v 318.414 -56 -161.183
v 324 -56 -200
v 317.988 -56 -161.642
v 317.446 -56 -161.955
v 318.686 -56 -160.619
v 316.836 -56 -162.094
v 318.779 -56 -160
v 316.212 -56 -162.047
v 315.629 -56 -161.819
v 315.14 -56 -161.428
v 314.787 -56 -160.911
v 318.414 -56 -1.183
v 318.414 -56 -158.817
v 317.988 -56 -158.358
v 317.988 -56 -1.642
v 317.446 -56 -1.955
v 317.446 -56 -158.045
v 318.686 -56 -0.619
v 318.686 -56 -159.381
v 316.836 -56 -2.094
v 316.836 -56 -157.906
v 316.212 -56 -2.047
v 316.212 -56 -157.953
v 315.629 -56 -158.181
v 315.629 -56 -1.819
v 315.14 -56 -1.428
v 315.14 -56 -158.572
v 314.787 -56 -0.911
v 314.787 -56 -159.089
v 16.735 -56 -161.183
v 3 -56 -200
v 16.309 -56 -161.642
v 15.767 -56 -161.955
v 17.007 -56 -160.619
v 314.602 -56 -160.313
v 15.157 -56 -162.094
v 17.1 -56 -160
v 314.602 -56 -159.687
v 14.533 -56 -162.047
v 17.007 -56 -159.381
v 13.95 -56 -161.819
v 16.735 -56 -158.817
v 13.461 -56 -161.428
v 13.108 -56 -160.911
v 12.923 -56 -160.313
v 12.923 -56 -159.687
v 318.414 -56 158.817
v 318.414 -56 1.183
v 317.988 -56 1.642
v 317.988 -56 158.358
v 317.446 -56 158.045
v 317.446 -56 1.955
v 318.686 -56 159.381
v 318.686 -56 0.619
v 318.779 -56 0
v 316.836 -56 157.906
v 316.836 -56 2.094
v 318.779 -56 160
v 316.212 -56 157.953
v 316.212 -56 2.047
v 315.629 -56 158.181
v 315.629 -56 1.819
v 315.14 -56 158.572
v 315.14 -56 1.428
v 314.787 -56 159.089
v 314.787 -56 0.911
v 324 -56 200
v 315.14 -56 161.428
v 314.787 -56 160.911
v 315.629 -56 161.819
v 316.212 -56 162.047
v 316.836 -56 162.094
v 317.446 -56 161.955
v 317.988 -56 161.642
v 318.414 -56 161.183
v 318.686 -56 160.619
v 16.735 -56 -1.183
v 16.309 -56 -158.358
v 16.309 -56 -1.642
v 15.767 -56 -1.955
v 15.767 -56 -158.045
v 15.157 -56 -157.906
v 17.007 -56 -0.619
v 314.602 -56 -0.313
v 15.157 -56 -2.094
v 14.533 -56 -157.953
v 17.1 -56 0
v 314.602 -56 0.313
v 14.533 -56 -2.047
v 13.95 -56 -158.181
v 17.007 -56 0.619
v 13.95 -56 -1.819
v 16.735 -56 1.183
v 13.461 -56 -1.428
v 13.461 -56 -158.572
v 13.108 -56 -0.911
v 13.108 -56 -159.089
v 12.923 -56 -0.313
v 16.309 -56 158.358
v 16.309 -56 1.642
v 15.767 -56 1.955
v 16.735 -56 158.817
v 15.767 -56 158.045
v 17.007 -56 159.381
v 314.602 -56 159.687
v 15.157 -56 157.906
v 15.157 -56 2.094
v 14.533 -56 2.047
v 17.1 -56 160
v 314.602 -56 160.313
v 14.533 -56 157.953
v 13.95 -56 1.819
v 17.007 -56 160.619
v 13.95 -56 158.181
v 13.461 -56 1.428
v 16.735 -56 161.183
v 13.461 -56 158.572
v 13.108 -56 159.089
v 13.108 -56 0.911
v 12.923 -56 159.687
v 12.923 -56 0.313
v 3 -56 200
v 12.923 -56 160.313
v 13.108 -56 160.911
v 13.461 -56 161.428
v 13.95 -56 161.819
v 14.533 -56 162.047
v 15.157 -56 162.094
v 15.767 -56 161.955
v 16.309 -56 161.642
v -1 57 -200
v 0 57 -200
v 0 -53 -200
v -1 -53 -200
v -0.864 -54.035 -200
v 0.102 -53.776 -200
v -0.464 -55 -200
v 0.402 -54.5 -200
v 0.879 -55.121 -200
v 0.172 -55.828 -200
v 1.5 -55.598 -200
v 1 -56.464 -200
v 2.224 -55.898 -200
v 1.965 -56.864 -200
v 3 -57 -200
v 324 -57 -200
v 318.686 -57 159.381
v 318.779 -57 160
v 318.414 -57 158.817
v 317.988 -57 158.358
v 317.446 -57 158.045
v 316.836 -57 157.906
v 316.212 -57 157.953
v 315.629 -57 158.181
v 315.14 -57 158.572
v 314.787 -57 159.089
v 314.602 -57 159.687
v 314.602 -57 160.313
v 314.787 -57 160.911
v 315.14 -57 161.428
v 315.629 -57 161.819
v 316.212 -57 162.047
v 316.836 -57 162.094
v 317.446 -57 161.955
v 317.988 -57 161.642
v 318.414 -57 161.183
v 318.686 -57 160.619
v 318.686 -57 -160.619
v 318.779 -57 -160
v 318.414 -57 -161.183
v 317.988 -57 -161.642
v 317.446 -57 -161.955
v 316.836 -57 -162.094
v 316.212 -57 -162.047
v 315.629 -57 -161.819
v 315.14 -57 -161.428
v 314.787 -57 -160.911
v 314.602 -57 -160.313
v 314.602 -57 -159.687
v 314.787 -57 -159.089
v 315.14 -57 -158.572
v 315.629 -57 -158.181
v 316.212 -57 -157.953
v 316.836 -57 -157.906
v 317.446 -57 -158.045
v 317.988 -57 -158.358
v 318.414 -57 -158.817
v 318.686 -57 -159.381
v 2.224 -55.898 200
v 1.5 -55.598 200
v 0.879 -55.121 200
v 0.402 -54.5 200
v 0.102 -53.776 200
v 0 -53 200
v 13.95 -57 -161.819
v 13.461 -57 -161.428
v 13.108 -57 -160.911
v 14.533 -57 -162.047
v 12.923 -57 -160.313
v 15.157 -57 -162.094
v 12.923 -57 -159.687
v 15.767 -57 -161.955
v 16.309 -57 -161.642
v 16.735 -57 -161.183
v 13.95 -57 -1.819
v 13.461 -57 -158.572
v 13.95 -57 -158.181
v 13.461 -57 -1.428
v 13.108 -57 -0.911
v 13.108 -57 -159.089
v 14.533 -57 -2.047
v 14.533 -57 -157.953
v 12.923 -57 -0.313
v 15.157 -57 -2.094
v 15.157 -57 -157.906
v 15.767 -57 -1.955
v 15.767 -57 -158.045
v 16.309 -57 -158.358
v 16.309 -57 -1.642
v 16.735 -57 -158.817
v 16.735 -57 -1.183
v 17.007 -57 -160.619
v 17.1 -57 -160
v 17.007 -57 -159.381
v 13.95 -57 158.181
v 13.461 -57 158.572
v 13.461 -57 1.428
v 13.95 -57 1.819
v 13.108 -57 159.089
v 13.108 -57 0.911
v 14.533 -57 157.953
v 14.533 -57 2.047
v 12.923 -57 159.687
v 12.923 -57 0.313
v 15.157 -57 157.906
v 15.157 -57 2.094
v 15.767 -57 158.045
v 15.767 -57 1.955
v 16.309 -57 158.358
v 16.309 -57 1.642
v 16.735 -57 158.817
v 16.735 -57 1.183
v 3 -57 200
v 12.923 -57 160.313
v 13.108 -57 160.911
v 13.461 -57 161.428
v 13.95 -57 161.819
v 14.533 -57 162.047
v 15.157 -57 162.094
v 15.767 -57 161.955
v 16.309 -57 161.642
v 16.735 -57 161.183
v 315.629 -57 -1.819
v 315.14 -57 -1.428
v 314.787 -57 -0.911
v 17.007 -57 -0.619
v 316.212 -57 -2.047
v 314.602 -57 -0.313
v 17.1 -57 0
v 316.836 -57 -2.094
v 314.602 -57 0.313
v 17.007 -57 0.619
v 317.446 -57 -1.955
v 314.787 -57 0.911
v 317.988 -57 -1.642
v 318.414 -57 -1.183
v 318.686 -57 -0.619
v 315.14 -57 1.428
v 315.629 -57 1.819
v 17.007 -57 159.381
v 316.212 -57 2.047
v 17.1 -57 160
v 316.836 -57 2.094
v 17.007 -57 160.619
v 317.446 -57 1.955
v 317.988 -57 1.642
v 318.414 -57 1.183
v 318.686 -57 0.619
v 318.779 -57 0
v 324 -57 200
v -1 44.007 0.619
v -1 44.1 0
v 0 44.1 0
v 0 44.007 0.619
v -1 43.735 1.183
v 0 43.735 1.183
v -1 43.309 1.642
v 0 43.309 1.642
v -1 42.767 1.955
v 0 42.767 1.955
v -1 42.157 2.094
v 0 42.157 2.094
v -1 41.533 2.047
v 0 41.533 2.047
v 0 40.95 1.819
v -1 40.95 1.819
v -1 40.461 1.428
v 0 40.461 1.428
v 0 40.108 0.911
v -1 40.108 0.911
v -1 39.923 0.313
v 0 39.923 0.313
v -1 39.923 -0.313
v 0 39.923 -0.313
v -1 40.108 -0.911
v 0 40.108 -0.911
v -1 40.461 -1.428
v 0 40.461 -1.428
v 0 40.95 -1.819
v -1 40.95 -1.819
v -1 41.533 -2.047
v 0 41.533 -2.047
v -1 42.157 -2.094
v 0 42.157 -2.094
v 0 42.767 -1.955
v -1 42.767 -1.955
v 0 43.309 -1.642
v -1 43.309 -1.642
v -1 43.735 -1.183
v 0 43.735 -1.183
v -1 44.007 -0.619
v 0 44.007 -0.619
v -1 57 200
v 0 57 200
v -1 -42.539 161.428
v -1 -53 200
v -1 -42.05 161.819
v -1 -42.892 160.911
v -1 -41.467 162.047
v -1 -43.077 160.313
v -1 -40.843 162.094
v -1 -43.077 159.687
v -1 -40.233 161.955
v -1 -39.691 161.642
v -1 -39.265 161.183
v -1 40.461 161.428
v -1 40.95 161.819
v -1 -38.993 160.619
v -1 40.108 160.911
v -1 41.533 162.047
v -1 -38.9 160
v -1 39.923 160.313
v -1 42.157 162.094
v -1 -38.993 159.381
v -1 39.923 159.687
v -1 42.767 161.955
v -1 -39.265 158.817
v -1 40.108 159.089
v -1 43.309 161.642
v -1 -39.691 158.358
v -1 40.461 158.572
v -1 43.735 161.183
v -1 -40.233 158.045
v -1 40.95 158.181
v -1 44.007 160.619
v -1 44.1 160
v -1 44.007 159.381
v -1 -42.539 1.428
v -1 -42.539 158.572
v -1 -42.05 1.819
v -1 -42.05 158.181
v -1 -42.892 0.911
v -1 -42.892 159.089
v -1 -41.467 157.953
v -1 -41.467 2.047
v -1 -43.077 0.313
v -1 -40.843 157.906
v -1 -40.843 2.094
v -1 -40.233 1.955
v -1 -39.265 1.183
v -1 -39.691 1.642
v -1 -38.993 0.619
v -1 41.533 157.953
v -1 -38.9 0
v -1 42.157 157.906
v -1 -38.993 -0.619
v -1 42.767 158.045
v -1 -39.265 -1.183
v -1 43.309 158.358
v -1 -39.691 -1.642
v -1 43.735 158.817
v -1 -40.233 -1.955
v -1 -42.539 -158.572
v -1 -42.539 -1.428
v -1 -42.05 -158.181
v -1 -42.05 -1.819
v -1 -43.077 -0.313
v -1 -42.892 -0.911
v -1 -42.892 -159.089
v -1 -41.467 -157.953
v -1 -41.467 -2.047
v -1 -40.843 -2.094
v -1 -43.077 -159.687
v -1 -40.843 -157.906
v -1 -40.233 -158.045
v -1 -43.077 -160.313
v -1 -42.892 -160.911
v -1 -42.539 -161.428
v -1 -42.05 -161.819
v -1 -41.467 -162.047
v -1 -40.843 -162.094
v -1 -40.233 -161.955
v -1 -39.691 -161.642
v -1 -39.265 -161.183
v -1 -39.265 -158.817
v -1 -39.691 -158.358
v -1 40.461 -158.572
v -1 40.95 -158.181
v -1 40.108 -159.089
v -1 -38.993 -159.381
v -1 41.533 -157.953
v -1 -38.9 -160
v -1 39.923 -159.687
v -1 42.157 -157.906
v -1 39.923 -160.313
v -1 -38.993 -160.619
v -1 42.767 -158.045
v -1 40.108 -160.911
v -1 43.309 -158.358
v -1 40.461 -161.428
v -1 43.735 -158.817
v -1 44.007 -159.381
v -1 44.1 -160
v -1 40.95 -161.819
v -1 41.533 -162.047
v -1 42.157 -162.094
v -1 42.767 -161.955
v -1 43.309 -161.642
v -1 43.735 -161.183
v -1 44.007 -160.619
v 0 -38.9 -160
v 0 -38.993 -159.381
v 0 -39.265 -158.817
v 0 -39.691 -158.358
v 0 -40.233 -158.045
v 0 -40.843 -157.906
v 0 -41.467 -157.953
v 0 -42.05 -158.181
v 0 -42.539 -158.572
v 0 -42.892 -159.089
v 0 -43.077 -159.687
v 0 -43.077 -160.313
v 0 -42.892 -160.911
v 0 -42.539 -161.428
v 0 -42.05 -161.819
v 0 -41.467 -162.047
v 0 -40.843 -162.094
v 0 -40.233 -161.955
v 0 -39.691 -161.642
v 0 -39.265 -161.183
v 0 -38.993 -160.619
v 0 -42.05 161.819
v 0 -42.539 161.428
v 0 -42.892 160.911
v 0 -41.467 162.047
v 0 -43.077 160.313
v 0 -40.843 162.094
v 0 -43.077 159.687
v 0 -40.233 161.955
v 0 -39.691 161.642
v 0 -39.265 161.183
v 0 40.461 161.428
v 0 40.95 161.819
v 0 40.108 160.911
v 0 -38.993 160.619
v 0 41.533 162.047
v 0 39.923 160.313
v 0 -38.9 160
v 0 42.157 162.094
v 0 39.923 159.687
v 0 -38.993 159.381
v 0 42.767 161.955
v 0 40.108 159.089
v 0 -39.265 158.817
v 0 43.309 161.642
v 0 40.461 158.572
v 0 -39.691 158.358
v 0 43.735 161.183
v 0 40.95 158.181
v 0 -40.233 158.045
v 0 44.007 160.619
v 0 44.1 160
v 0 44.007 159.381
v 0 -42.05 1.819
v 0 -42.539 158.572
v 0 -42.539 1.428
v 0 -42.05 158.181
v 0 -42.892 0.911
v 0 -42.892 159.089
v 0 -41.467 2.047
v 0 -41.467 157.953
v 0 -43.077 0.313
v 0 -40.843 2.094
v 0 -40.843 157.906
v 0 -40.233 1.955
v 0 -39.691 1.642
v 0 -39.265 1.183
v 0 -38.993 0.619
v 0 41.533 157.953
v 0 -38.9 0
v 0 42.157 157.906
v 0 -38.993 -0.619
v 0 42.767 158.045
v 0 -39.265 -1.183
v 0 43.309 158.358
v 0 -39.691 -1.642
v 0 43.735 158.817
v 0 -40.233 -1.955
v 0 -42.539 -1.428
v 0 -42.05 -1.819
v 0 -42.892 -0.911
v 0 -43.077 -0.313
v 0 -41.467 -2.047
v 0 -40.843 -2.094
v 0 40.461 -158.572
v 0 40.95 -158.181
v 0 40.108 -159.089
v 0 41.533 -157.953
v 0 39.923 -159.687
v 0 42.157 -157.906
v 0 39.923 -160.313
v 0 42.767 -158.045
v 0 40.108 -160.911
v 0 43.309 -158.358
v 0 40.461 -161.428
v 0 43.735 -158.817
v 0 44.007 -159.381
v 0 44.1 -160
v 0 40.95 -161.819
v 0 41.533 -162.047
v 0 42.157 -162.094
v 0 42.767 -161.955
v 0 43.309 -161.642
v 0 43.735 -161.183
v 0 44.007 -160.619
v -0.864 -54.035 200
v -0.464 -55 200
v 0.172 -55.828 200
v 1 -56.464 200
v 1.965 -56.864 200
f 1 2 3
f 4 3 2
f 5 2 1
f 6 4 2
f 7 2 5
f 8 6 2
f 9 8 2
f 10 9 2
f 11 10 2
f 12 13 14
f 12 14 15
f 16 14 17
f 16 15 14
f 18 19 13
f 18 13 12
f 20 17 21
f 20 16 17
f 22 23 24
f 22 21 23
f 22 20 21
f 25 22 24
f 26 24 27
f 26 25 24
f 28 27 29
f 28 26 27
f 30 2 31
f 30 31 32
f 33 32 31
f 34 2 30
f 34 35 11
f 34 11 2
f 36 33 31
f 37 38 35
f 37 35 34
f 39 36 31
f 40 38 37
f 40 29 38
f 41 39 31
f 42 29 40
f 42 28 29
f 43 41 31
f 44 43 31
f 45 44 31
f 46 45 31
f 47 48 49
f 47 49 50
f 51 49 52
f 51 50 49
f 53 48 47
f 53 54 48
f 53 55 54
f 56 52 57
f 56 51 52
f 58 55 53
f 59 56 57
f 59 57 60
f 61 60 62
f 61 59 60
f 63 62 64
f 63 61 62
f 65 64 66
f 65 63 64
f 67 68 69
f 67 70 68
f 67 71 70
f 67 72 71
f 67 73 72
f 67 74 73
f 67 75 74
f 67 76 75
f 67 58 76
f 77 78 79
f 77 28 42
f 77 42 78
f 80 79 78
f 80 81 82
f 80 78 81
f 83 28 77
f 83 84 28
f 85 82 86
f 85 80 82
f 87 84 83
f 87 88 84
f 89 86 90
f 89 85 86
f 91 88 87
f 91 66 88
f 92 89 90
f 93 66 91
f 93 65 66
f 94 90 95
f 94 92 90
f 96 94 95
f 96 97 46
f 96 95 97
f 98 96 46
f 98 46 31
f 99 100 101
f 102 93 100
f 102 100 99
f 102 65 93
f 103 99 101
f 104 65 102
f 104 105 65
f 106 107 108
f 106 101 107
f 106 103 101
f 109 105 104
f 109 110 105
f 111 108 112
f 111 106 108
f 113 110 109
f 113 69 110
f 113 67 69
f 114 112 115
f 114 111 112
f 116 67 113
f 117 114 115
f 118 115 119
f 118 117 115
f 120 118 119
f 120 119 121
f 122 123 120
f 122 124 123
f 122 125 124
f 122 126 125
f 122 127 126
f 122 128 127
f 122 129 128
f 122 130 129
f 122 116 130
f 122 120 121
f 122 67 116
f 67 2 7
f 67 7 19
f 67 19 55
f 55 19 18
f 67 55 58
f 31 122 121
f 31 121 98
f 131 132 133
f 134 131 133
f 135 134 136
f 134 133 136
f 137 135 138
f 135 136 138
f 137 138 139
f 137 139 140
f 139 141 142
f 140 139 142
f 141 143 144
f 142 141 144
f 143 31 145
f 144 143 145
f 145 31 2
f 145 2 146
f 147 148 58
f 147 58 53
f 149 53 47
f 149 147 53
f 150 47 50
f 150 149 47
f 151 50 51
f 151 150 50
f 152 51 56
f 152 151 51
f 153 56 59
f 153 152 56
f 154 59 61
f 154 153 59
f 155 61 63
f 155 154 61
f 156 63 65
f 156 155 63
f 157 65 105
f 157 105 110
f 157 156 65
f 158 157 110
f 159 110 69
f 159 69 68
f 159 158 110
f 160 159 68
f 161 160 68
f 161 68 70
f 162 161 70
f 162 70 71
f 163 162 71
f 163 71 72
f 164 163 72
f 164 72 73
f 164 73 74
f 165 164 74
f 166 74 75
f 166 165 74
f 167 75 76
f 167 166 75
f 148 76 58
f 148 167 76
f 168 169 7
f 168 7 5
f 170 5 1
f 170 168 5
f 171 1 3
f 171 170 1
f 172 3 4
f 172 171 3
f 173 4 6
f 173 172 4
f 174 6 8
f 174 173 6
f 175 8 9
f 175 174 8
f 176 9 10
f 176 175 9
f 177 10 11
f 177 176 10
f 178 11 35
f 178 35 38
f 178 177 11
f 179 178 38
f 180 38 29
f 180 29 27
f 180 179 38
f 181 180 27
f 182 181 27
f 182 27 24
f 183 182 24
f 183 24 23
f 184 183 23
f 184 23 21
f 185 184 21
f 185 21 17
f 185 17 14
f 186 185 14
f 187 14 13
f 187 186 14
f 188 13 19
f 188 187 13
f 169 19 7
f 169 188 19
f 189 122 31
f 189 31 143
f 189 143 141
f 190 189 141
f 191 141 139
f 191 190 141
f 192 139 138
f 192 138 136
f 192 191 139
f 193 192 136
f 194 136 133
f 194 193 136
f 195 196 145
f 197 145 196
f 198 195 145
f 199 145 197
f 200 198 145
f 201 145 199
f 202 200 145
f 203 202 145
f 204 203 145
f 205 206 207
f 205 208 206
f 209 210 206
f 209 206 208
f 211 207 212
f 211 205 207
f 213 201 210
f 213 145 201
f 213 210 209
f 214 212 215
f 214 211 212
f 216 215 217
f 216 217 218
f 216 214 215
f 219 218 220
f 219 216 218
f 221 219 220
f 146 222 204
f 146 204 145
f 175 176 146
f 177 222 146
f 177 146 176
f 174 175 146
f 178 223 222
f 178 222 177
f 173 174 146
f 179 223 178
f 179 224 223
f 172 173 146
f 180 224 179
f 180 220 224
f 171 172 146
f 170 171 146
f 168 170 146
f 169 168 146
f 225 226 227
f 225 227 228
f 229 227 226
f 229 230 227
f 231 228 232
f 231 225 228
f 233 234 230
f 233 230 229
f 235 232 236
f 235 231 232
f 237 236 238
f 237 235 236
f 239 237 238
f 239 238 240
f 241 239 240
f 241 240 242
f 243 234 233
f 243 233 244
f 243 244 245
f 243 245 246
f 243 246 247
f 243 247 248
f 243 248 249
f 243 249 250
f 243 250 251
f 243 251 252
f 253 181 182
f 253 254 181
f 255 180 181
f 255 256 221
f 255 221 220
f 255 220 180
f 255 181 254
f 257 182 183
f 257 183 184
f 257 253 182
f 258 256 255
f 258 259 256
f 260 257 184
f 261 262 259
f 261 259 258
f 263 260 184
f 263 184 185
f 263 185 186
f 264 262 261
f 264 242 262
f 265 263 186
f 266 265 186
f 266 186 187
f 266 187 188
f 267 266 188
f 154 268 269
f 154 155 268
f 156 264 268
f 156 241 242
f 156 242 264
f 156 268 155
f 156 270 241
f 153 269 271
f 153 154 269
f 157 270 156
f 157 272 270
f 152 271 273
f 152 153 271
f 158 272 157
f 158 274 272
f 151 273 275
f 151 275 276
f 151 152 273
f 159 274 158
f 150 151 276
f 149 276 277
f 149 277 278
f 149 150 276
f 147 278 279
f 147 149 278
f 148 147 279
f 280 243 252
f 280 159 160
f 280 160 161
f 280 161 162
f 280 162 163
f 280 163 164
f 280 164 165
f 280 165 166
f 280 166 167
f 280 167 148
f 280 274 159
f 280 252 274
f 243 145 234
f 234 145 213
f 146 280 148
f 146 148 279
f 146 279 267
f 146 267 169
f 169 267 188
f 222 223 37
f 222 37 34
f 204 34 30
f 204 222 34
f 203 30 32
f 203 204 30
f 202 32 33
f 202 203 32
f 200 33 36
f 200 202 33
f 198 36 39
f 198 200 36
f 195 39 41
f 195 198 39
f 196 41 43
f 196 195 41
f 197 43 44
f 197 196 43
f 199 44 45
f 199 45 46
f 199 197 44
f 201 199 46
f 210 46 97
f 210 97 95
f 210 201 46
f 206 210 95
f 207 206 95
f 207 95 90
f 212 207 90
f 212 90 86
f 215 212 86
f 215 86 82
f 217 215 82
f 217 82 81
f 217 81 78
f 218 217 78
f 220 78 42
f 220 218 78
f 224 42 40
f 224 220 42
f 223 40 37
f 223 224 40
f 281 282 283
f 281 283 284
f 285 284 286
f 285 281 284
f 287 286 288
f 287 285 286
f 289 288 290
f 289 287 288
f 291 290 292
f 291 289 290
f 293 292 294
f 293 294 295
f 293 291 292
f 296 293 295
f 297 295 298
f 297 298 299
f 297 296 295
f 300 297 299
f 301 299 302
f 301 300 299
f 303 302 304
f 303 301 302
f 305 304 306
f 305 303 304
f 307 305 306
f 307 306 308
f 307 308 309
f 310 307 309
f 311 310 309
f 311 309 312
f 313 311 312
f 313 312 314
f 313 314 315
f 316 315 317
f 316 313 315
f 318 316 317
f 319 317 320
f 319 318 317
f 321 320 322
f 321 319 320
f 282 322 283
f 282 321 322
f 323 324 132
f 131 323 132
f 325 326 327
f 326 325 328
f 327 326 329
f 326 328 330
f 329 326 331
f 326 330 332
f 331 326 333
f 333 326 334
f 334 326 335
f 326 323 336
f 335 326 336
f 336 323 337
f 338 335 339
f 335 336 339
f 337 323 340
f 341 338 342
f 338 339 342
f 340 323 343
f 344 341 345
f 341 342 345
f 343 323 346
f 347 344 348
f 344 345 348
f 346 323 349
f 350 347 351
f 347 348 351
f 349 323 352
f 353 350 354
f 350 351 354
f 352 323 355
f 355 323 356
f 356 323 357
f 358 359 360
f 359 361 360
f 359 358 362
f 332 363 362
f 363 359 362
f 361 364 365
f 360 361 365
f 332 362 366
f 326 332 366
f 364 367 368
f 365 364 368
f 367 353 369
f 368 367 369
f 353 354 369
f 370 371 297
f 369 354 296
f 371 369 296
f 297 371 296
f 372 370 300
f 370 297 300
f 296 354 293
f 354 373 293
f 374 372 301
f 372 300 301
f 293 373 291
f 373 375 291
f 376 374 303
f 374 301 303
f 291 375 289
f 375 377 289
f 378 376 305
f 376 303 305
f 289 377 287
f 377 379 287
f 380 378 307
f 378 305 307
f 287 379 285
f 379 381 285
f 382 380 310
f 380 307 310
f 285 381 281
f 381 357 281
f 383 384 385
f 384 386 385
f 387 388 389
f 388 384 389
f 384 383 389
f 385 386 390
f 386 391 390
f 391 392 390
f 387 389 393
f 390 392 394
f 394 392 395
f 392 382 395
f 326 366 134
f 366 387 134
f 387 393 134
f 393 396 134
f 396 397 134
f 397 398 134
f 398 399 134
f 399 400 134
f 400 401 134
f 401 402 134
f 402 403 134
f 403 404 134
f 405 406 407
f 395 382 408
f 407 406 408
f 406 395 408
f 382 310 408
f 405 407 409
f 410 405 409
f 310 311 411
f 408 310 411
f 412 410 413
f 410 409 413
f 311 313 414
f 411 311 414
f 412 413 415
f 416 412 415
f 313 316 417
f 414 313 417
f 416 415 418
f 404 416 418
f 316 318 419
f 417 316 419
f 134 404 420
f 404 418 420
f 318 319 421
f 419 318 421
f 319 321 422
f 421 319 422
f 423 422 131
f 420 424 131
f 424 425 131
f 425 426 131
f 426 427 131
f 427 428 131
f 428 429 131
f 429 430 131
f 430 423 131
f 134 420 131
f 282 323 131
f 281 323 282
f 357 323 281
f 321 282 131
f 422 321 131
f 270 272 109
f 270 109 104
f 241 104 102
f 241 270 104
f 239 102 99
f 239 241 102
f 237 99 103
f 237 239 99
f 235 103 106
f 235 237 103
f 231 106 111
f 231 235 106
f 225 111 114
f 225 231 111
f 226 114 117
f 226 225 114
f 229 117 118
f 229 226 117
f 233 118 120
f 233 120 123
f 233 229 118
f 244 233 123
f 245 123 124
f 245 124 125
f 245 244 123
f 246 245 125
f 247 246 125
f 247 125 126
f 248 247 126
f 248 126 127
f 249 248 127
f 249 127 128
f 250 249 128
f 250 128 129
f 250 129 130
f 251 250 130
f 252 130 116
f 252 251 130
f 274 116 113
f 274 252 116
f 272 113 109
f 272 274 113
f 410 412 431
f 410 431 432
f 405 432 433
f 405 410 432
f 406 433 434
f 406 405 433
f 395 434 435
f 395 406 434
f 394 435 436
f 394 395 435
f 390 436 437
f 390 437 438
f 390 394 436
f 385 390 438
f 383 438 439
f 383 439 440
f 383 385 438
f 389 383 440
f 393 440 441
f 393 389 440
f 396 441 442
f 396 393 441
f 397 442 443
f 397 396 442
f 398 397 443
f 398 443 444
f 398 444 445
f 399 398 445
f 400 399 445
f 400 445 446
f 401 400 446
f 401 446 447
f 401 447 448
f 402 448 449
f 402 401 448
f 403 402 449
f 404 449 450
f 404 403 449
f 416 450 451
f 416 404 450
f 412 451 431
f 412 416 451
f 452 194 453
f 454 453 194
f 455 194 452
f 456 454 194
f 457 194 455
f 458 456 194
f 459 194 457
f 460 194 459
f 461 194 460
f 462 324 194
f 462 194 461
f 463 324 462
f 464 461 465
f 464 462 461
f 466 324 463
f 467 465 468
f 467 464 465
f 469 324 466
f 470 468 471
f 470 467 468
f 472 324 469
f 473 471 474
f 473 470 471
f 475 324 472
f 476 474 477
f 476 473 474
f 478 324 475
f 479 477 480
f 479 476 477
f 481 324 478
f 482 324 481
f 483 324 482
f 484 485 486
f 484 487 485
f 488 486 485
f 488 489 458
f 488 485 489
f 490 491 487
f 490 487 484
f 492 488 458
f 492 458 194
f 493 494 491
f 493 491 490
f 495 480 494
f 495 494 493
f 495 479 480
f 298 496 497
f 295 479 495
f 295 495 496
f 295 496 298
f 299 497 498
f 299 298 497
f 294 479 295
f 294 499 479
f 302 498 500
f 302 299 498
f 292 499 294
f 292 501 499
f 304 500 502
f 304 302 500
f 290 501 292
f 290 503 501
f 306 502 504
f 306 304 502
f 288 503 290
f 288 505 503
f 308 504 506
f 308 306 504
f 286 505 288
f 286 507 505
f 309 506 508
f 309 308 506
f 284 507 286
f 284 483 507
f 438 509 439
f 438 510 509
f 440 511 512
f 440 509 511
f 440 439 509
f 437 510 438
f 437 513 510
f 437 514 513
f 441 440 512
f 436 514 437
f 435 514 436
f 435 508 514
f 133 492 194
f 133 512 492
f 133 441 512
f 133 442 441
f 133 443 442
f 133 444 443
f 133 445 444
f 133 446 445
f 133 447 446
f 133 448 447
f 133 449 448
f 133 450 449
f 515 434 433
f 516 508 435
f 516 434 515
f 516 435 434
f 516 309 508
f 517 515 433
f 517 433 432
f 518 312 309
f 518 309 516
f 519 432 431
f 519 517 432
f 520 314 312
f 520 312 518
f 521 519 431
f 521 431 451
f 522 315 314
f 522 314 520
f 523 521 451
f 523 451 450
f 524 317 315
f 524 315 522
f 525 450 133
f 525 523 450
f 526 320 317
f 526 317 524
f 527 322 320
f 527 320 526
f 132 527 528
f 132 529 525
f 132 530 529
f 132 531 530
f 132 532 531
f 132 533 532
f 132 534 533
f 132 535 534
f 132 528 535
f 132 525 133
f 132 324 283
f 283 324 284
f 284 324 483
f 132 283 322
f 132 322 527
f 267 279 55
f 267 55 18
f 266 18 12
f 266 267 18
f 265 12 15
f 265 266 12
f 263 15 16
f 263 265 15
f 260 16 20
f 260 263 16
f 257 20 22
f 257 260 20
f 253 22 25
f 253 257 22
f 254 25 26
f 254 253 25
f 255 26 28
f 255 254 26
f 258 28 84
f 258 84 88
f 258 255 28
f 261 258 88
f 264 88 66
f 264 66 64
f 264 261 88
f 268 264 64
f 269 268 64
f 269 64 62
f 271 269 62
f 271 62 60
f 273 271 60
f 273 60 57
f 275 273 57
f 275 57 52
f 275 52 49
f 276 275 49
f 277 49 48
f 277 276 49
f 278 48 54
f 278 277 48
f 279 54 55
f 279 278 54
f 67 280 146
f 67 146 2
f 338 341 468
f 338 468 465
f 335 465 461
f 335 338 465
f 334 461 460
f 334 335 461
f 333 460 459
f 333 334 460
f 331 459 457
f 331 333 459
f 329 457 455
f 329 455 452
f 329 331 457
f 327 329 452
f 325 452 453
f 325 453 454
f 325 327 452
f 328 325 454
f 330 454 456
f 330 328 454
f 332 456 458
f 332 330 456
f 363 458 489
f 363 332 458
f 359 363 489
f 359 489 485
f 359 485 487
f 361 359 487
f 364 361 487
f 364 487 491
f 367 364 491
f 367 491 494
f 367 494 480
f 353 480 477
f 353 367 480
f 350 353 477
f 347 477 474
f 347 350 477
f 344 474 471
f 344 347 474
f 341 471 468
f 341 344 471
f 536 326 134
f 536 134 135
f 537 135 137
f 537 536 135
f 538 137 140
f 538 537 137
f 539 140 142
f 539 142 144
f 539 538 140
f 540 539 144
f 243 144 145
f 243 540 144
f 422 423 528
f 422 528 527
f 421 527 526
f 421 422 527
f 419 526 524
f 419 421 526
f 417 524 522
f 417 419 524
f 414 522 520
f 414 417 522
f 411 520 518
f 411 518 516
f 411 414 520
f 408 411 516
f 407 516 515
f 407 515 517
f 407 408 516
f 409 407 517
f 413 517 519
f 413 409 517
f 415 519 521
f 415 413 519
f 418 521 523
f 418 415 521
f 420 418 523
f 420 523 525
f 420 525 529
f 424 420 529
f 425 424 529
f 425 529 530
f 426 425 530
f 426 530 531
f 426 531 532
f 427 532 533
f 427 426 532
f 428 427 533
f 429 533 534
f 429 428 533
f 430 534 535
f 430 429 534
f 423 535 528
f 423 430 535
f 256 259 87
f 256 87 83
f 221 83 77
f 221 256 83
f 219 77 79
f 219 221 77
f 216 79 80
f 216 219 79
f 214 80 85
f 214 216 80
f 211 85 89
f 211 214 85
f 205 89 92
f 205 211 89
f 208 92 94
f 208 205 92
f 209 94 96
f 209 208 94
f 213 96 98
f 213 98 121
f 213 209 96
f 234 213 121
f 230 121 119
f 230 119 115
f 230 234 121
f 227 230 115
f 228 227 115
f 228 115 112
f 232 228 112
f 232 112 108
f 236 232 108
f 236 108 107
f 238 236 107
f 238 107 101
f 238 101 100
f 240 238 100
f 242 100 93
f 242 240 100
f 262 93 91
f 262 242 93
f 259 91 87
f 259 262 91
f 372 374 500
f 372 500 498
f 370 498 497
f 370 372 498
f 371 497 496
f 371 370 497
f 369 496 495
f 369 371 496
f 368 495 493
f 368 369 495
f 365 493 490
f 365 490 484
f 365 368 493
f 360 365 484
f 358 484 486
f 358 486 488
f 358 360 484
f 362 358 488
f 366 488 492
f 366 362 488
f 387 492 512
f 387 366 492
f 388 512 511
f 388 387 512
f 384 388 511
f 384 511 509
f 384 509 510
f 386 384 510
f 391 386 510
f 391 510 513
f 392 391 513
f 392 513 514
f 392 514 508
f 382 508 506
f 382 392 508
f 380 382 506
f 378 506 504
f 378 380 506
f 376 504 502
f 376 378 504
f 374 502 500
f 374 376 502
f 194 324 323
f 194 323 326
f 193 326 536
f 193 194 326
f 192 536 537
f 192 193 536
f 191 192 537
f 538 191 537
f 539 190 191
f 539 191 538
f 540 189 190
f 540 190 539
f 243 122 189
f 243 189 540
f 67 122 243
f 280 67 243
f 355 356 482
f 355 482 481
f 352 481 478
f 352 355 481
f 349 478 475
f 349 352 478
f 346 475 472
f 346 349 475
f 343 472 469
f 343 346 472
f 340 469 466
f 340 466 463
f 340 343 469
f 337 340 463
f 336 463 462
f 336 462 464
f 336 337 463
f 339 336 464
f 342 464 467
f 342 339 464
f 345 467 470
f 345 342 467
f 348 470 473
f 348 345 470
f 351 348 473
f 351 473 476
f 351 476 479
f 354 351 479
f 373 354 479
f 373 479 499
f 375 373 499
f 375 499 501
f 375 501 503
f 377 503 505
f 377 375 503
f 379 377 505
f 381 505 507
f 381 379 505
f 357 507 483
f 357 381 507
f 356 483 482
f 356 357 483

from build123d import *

# Parameters (mm, degrees)
SKETCH1_W                            = 400
SKETCH1_H                            = 114
BASE_FLANGE1_DEPTH                   = 1
EDGE_FLANGE1_STRIP_W                 = 10
EDGE_FLANGE1_STRIP_H                 = 1
EDGE_FLANGE1_STRIP_CUT_DEPTH         = 400
EDGE_FLANGE1_DEPTH                   = 400
F_4_2_START                          = -57
F_4_2_4_2_DIAMETER_HOLE1_OUTLINE_R   = 2.1
F_4_2_4_2_DIAMETER_HOLE1_DEPTH       = 1
F_4_2_START_2                        = -1
F_4_2_4_2_DIAMETER_HOLE1_2_OUTLINE_R = 2.1
F_4_2_4_2_DIAMETER_HOLE1_2_DEPTH     = 1


# Read off the part's stored shape, not the designer's step: Ø4.2 (4.2) Diameter Hole1
# Sheet-metal steps are written as plain solids
with BuildPart() as part:
    # Sketch1 → Base-Flange1 (new body)
    with BuildSketch(Plane(origin=(0, 0, 0), x_dir=(0, 0, -1), z_dir=(1, 0, 0))):
        Rectangle(SKETCH1_W, SKETCH1_H)
    extrude(amount=-BASE_FLANGE1_DEPTH)

    # Edge-Flange1 strip (across the edge) → Edge-Flange1 strip cut (cut)
    with BuildSketch(Plane(origin=(0, -57, 200), x_dir=(0, 1, 0), z_dir=(0, 0, -1))):
        with Locations((-1, -0.5)):
            Rectangle(EDGE_FLANGE1_STRIP_W, EDGE_FLANGE1_STRIP_H)
    extrude(amount=EDGE_FLANGE1_STRIP_CUT_DEPTH, mode=Mode.SUBTRACT)

    # Edge-Flange1 section (across the edge) → Edge-Flange1 (add)
    with BuildSketch(Plane(origin=(0, -57, 200), x_dir=(0, 1, 0), z_dir=(0, 0, -1))):
        with BuildLine():
            Line((0, 3), (0, 324))
            Line((0, 324), (1, 324))
            Line((1, 324), (1, 3))
            ThreePointArc((1, 3), (1.878679656, 0.878679656), (4, 0))
            Line((4, 0), (4, -1))
            ThreePointArc((4, -1), (1.171572875, 0.171572875), (0, 3))
        make_face()
    extrude(amount=EDGE_FLANGE1_DEPTH)

    # Ø4.2 (4.2) Diameter Hole1 outline → Ø4.2 (4.2) Diameter Hole1 (cut)
    with BuildSketch(Plane(origin=(0, 0, 0), x_dir=(1, 0, 0), z_dir=(0, 1, 0)).offset(F_4_2_START)):
        with Locations((15, 160)):
            Circle(F_4_2_4_2_DIAMETER_HOLE1_OUTLINE_R)
        with Locations((15, 0)):
            Circle(F_4_2_4_2_DIAMETER_HOLE1_OUTLINE_R)
        with Locations((15, -160)):
            Circle(F_4_2_4_2_DIAMETER_HOLE1_OUTLINE_R)
        with Locations((316.678974837, -160)):
            Circle(F_4_2_4_2_DIAMETER_HOLE1_OUTLINE_R)
        with Locations((316.678974837, 0)):
            Circle(F_4_2_4_2_DIAMETER_HOLE1_OUTLINE_R)
        with Locations((316.678974837, 160)):
            Circle(F_4_2_4_2_DIAMETER_HOLE1_OUTLINE_R)
    extrude(amount=F_4_2_4_2_DIAMETER_HOLE1_DEPTH, mode=Mode.SUBTRACT)

    # 4.2 _4.2_ Diameter Hole1 2 outline → 4.2 _4.2_ Diameter Hole1 2 (cut)
    with BuildSketch(Plane.YZ.offset(F_4_2_START_2)):
        with Locations((42, -160)):
            Circle(F_4_2_4_2_DIAMETER_HOLE1_2_OUTLINE_R)
        with Locations((42, 0)):
            Circle(F_4_2_4_2_DIAMETER_HOLE1_2_OUTLINE_R)
        with Locations((42, 160)):
            Circle(F_4_2_4_2_DIAMETER_HOLE1_2_OUTLINE_R)
        with Locations((-41, 160)):
            Circle(F_4_2_4_2_DIAMETER_HOLE1_2_OUTLINE_R)
        with Locations((-41, 0)):
            Circle(F_4_2_4_2_DIAMETER_HOLE1_2_OUTLINE_R)
        with Locations((-41, -160)):
            Circle(F_4_2_4_2_DIAMETER_HOLE1_2_OUTLINE_R)
    extrude(amount=F_4_2_4_2_DIAMETER_HOLE1_2_DEPTH, mode=Mode.SUBTRACT)


solid = part.part
